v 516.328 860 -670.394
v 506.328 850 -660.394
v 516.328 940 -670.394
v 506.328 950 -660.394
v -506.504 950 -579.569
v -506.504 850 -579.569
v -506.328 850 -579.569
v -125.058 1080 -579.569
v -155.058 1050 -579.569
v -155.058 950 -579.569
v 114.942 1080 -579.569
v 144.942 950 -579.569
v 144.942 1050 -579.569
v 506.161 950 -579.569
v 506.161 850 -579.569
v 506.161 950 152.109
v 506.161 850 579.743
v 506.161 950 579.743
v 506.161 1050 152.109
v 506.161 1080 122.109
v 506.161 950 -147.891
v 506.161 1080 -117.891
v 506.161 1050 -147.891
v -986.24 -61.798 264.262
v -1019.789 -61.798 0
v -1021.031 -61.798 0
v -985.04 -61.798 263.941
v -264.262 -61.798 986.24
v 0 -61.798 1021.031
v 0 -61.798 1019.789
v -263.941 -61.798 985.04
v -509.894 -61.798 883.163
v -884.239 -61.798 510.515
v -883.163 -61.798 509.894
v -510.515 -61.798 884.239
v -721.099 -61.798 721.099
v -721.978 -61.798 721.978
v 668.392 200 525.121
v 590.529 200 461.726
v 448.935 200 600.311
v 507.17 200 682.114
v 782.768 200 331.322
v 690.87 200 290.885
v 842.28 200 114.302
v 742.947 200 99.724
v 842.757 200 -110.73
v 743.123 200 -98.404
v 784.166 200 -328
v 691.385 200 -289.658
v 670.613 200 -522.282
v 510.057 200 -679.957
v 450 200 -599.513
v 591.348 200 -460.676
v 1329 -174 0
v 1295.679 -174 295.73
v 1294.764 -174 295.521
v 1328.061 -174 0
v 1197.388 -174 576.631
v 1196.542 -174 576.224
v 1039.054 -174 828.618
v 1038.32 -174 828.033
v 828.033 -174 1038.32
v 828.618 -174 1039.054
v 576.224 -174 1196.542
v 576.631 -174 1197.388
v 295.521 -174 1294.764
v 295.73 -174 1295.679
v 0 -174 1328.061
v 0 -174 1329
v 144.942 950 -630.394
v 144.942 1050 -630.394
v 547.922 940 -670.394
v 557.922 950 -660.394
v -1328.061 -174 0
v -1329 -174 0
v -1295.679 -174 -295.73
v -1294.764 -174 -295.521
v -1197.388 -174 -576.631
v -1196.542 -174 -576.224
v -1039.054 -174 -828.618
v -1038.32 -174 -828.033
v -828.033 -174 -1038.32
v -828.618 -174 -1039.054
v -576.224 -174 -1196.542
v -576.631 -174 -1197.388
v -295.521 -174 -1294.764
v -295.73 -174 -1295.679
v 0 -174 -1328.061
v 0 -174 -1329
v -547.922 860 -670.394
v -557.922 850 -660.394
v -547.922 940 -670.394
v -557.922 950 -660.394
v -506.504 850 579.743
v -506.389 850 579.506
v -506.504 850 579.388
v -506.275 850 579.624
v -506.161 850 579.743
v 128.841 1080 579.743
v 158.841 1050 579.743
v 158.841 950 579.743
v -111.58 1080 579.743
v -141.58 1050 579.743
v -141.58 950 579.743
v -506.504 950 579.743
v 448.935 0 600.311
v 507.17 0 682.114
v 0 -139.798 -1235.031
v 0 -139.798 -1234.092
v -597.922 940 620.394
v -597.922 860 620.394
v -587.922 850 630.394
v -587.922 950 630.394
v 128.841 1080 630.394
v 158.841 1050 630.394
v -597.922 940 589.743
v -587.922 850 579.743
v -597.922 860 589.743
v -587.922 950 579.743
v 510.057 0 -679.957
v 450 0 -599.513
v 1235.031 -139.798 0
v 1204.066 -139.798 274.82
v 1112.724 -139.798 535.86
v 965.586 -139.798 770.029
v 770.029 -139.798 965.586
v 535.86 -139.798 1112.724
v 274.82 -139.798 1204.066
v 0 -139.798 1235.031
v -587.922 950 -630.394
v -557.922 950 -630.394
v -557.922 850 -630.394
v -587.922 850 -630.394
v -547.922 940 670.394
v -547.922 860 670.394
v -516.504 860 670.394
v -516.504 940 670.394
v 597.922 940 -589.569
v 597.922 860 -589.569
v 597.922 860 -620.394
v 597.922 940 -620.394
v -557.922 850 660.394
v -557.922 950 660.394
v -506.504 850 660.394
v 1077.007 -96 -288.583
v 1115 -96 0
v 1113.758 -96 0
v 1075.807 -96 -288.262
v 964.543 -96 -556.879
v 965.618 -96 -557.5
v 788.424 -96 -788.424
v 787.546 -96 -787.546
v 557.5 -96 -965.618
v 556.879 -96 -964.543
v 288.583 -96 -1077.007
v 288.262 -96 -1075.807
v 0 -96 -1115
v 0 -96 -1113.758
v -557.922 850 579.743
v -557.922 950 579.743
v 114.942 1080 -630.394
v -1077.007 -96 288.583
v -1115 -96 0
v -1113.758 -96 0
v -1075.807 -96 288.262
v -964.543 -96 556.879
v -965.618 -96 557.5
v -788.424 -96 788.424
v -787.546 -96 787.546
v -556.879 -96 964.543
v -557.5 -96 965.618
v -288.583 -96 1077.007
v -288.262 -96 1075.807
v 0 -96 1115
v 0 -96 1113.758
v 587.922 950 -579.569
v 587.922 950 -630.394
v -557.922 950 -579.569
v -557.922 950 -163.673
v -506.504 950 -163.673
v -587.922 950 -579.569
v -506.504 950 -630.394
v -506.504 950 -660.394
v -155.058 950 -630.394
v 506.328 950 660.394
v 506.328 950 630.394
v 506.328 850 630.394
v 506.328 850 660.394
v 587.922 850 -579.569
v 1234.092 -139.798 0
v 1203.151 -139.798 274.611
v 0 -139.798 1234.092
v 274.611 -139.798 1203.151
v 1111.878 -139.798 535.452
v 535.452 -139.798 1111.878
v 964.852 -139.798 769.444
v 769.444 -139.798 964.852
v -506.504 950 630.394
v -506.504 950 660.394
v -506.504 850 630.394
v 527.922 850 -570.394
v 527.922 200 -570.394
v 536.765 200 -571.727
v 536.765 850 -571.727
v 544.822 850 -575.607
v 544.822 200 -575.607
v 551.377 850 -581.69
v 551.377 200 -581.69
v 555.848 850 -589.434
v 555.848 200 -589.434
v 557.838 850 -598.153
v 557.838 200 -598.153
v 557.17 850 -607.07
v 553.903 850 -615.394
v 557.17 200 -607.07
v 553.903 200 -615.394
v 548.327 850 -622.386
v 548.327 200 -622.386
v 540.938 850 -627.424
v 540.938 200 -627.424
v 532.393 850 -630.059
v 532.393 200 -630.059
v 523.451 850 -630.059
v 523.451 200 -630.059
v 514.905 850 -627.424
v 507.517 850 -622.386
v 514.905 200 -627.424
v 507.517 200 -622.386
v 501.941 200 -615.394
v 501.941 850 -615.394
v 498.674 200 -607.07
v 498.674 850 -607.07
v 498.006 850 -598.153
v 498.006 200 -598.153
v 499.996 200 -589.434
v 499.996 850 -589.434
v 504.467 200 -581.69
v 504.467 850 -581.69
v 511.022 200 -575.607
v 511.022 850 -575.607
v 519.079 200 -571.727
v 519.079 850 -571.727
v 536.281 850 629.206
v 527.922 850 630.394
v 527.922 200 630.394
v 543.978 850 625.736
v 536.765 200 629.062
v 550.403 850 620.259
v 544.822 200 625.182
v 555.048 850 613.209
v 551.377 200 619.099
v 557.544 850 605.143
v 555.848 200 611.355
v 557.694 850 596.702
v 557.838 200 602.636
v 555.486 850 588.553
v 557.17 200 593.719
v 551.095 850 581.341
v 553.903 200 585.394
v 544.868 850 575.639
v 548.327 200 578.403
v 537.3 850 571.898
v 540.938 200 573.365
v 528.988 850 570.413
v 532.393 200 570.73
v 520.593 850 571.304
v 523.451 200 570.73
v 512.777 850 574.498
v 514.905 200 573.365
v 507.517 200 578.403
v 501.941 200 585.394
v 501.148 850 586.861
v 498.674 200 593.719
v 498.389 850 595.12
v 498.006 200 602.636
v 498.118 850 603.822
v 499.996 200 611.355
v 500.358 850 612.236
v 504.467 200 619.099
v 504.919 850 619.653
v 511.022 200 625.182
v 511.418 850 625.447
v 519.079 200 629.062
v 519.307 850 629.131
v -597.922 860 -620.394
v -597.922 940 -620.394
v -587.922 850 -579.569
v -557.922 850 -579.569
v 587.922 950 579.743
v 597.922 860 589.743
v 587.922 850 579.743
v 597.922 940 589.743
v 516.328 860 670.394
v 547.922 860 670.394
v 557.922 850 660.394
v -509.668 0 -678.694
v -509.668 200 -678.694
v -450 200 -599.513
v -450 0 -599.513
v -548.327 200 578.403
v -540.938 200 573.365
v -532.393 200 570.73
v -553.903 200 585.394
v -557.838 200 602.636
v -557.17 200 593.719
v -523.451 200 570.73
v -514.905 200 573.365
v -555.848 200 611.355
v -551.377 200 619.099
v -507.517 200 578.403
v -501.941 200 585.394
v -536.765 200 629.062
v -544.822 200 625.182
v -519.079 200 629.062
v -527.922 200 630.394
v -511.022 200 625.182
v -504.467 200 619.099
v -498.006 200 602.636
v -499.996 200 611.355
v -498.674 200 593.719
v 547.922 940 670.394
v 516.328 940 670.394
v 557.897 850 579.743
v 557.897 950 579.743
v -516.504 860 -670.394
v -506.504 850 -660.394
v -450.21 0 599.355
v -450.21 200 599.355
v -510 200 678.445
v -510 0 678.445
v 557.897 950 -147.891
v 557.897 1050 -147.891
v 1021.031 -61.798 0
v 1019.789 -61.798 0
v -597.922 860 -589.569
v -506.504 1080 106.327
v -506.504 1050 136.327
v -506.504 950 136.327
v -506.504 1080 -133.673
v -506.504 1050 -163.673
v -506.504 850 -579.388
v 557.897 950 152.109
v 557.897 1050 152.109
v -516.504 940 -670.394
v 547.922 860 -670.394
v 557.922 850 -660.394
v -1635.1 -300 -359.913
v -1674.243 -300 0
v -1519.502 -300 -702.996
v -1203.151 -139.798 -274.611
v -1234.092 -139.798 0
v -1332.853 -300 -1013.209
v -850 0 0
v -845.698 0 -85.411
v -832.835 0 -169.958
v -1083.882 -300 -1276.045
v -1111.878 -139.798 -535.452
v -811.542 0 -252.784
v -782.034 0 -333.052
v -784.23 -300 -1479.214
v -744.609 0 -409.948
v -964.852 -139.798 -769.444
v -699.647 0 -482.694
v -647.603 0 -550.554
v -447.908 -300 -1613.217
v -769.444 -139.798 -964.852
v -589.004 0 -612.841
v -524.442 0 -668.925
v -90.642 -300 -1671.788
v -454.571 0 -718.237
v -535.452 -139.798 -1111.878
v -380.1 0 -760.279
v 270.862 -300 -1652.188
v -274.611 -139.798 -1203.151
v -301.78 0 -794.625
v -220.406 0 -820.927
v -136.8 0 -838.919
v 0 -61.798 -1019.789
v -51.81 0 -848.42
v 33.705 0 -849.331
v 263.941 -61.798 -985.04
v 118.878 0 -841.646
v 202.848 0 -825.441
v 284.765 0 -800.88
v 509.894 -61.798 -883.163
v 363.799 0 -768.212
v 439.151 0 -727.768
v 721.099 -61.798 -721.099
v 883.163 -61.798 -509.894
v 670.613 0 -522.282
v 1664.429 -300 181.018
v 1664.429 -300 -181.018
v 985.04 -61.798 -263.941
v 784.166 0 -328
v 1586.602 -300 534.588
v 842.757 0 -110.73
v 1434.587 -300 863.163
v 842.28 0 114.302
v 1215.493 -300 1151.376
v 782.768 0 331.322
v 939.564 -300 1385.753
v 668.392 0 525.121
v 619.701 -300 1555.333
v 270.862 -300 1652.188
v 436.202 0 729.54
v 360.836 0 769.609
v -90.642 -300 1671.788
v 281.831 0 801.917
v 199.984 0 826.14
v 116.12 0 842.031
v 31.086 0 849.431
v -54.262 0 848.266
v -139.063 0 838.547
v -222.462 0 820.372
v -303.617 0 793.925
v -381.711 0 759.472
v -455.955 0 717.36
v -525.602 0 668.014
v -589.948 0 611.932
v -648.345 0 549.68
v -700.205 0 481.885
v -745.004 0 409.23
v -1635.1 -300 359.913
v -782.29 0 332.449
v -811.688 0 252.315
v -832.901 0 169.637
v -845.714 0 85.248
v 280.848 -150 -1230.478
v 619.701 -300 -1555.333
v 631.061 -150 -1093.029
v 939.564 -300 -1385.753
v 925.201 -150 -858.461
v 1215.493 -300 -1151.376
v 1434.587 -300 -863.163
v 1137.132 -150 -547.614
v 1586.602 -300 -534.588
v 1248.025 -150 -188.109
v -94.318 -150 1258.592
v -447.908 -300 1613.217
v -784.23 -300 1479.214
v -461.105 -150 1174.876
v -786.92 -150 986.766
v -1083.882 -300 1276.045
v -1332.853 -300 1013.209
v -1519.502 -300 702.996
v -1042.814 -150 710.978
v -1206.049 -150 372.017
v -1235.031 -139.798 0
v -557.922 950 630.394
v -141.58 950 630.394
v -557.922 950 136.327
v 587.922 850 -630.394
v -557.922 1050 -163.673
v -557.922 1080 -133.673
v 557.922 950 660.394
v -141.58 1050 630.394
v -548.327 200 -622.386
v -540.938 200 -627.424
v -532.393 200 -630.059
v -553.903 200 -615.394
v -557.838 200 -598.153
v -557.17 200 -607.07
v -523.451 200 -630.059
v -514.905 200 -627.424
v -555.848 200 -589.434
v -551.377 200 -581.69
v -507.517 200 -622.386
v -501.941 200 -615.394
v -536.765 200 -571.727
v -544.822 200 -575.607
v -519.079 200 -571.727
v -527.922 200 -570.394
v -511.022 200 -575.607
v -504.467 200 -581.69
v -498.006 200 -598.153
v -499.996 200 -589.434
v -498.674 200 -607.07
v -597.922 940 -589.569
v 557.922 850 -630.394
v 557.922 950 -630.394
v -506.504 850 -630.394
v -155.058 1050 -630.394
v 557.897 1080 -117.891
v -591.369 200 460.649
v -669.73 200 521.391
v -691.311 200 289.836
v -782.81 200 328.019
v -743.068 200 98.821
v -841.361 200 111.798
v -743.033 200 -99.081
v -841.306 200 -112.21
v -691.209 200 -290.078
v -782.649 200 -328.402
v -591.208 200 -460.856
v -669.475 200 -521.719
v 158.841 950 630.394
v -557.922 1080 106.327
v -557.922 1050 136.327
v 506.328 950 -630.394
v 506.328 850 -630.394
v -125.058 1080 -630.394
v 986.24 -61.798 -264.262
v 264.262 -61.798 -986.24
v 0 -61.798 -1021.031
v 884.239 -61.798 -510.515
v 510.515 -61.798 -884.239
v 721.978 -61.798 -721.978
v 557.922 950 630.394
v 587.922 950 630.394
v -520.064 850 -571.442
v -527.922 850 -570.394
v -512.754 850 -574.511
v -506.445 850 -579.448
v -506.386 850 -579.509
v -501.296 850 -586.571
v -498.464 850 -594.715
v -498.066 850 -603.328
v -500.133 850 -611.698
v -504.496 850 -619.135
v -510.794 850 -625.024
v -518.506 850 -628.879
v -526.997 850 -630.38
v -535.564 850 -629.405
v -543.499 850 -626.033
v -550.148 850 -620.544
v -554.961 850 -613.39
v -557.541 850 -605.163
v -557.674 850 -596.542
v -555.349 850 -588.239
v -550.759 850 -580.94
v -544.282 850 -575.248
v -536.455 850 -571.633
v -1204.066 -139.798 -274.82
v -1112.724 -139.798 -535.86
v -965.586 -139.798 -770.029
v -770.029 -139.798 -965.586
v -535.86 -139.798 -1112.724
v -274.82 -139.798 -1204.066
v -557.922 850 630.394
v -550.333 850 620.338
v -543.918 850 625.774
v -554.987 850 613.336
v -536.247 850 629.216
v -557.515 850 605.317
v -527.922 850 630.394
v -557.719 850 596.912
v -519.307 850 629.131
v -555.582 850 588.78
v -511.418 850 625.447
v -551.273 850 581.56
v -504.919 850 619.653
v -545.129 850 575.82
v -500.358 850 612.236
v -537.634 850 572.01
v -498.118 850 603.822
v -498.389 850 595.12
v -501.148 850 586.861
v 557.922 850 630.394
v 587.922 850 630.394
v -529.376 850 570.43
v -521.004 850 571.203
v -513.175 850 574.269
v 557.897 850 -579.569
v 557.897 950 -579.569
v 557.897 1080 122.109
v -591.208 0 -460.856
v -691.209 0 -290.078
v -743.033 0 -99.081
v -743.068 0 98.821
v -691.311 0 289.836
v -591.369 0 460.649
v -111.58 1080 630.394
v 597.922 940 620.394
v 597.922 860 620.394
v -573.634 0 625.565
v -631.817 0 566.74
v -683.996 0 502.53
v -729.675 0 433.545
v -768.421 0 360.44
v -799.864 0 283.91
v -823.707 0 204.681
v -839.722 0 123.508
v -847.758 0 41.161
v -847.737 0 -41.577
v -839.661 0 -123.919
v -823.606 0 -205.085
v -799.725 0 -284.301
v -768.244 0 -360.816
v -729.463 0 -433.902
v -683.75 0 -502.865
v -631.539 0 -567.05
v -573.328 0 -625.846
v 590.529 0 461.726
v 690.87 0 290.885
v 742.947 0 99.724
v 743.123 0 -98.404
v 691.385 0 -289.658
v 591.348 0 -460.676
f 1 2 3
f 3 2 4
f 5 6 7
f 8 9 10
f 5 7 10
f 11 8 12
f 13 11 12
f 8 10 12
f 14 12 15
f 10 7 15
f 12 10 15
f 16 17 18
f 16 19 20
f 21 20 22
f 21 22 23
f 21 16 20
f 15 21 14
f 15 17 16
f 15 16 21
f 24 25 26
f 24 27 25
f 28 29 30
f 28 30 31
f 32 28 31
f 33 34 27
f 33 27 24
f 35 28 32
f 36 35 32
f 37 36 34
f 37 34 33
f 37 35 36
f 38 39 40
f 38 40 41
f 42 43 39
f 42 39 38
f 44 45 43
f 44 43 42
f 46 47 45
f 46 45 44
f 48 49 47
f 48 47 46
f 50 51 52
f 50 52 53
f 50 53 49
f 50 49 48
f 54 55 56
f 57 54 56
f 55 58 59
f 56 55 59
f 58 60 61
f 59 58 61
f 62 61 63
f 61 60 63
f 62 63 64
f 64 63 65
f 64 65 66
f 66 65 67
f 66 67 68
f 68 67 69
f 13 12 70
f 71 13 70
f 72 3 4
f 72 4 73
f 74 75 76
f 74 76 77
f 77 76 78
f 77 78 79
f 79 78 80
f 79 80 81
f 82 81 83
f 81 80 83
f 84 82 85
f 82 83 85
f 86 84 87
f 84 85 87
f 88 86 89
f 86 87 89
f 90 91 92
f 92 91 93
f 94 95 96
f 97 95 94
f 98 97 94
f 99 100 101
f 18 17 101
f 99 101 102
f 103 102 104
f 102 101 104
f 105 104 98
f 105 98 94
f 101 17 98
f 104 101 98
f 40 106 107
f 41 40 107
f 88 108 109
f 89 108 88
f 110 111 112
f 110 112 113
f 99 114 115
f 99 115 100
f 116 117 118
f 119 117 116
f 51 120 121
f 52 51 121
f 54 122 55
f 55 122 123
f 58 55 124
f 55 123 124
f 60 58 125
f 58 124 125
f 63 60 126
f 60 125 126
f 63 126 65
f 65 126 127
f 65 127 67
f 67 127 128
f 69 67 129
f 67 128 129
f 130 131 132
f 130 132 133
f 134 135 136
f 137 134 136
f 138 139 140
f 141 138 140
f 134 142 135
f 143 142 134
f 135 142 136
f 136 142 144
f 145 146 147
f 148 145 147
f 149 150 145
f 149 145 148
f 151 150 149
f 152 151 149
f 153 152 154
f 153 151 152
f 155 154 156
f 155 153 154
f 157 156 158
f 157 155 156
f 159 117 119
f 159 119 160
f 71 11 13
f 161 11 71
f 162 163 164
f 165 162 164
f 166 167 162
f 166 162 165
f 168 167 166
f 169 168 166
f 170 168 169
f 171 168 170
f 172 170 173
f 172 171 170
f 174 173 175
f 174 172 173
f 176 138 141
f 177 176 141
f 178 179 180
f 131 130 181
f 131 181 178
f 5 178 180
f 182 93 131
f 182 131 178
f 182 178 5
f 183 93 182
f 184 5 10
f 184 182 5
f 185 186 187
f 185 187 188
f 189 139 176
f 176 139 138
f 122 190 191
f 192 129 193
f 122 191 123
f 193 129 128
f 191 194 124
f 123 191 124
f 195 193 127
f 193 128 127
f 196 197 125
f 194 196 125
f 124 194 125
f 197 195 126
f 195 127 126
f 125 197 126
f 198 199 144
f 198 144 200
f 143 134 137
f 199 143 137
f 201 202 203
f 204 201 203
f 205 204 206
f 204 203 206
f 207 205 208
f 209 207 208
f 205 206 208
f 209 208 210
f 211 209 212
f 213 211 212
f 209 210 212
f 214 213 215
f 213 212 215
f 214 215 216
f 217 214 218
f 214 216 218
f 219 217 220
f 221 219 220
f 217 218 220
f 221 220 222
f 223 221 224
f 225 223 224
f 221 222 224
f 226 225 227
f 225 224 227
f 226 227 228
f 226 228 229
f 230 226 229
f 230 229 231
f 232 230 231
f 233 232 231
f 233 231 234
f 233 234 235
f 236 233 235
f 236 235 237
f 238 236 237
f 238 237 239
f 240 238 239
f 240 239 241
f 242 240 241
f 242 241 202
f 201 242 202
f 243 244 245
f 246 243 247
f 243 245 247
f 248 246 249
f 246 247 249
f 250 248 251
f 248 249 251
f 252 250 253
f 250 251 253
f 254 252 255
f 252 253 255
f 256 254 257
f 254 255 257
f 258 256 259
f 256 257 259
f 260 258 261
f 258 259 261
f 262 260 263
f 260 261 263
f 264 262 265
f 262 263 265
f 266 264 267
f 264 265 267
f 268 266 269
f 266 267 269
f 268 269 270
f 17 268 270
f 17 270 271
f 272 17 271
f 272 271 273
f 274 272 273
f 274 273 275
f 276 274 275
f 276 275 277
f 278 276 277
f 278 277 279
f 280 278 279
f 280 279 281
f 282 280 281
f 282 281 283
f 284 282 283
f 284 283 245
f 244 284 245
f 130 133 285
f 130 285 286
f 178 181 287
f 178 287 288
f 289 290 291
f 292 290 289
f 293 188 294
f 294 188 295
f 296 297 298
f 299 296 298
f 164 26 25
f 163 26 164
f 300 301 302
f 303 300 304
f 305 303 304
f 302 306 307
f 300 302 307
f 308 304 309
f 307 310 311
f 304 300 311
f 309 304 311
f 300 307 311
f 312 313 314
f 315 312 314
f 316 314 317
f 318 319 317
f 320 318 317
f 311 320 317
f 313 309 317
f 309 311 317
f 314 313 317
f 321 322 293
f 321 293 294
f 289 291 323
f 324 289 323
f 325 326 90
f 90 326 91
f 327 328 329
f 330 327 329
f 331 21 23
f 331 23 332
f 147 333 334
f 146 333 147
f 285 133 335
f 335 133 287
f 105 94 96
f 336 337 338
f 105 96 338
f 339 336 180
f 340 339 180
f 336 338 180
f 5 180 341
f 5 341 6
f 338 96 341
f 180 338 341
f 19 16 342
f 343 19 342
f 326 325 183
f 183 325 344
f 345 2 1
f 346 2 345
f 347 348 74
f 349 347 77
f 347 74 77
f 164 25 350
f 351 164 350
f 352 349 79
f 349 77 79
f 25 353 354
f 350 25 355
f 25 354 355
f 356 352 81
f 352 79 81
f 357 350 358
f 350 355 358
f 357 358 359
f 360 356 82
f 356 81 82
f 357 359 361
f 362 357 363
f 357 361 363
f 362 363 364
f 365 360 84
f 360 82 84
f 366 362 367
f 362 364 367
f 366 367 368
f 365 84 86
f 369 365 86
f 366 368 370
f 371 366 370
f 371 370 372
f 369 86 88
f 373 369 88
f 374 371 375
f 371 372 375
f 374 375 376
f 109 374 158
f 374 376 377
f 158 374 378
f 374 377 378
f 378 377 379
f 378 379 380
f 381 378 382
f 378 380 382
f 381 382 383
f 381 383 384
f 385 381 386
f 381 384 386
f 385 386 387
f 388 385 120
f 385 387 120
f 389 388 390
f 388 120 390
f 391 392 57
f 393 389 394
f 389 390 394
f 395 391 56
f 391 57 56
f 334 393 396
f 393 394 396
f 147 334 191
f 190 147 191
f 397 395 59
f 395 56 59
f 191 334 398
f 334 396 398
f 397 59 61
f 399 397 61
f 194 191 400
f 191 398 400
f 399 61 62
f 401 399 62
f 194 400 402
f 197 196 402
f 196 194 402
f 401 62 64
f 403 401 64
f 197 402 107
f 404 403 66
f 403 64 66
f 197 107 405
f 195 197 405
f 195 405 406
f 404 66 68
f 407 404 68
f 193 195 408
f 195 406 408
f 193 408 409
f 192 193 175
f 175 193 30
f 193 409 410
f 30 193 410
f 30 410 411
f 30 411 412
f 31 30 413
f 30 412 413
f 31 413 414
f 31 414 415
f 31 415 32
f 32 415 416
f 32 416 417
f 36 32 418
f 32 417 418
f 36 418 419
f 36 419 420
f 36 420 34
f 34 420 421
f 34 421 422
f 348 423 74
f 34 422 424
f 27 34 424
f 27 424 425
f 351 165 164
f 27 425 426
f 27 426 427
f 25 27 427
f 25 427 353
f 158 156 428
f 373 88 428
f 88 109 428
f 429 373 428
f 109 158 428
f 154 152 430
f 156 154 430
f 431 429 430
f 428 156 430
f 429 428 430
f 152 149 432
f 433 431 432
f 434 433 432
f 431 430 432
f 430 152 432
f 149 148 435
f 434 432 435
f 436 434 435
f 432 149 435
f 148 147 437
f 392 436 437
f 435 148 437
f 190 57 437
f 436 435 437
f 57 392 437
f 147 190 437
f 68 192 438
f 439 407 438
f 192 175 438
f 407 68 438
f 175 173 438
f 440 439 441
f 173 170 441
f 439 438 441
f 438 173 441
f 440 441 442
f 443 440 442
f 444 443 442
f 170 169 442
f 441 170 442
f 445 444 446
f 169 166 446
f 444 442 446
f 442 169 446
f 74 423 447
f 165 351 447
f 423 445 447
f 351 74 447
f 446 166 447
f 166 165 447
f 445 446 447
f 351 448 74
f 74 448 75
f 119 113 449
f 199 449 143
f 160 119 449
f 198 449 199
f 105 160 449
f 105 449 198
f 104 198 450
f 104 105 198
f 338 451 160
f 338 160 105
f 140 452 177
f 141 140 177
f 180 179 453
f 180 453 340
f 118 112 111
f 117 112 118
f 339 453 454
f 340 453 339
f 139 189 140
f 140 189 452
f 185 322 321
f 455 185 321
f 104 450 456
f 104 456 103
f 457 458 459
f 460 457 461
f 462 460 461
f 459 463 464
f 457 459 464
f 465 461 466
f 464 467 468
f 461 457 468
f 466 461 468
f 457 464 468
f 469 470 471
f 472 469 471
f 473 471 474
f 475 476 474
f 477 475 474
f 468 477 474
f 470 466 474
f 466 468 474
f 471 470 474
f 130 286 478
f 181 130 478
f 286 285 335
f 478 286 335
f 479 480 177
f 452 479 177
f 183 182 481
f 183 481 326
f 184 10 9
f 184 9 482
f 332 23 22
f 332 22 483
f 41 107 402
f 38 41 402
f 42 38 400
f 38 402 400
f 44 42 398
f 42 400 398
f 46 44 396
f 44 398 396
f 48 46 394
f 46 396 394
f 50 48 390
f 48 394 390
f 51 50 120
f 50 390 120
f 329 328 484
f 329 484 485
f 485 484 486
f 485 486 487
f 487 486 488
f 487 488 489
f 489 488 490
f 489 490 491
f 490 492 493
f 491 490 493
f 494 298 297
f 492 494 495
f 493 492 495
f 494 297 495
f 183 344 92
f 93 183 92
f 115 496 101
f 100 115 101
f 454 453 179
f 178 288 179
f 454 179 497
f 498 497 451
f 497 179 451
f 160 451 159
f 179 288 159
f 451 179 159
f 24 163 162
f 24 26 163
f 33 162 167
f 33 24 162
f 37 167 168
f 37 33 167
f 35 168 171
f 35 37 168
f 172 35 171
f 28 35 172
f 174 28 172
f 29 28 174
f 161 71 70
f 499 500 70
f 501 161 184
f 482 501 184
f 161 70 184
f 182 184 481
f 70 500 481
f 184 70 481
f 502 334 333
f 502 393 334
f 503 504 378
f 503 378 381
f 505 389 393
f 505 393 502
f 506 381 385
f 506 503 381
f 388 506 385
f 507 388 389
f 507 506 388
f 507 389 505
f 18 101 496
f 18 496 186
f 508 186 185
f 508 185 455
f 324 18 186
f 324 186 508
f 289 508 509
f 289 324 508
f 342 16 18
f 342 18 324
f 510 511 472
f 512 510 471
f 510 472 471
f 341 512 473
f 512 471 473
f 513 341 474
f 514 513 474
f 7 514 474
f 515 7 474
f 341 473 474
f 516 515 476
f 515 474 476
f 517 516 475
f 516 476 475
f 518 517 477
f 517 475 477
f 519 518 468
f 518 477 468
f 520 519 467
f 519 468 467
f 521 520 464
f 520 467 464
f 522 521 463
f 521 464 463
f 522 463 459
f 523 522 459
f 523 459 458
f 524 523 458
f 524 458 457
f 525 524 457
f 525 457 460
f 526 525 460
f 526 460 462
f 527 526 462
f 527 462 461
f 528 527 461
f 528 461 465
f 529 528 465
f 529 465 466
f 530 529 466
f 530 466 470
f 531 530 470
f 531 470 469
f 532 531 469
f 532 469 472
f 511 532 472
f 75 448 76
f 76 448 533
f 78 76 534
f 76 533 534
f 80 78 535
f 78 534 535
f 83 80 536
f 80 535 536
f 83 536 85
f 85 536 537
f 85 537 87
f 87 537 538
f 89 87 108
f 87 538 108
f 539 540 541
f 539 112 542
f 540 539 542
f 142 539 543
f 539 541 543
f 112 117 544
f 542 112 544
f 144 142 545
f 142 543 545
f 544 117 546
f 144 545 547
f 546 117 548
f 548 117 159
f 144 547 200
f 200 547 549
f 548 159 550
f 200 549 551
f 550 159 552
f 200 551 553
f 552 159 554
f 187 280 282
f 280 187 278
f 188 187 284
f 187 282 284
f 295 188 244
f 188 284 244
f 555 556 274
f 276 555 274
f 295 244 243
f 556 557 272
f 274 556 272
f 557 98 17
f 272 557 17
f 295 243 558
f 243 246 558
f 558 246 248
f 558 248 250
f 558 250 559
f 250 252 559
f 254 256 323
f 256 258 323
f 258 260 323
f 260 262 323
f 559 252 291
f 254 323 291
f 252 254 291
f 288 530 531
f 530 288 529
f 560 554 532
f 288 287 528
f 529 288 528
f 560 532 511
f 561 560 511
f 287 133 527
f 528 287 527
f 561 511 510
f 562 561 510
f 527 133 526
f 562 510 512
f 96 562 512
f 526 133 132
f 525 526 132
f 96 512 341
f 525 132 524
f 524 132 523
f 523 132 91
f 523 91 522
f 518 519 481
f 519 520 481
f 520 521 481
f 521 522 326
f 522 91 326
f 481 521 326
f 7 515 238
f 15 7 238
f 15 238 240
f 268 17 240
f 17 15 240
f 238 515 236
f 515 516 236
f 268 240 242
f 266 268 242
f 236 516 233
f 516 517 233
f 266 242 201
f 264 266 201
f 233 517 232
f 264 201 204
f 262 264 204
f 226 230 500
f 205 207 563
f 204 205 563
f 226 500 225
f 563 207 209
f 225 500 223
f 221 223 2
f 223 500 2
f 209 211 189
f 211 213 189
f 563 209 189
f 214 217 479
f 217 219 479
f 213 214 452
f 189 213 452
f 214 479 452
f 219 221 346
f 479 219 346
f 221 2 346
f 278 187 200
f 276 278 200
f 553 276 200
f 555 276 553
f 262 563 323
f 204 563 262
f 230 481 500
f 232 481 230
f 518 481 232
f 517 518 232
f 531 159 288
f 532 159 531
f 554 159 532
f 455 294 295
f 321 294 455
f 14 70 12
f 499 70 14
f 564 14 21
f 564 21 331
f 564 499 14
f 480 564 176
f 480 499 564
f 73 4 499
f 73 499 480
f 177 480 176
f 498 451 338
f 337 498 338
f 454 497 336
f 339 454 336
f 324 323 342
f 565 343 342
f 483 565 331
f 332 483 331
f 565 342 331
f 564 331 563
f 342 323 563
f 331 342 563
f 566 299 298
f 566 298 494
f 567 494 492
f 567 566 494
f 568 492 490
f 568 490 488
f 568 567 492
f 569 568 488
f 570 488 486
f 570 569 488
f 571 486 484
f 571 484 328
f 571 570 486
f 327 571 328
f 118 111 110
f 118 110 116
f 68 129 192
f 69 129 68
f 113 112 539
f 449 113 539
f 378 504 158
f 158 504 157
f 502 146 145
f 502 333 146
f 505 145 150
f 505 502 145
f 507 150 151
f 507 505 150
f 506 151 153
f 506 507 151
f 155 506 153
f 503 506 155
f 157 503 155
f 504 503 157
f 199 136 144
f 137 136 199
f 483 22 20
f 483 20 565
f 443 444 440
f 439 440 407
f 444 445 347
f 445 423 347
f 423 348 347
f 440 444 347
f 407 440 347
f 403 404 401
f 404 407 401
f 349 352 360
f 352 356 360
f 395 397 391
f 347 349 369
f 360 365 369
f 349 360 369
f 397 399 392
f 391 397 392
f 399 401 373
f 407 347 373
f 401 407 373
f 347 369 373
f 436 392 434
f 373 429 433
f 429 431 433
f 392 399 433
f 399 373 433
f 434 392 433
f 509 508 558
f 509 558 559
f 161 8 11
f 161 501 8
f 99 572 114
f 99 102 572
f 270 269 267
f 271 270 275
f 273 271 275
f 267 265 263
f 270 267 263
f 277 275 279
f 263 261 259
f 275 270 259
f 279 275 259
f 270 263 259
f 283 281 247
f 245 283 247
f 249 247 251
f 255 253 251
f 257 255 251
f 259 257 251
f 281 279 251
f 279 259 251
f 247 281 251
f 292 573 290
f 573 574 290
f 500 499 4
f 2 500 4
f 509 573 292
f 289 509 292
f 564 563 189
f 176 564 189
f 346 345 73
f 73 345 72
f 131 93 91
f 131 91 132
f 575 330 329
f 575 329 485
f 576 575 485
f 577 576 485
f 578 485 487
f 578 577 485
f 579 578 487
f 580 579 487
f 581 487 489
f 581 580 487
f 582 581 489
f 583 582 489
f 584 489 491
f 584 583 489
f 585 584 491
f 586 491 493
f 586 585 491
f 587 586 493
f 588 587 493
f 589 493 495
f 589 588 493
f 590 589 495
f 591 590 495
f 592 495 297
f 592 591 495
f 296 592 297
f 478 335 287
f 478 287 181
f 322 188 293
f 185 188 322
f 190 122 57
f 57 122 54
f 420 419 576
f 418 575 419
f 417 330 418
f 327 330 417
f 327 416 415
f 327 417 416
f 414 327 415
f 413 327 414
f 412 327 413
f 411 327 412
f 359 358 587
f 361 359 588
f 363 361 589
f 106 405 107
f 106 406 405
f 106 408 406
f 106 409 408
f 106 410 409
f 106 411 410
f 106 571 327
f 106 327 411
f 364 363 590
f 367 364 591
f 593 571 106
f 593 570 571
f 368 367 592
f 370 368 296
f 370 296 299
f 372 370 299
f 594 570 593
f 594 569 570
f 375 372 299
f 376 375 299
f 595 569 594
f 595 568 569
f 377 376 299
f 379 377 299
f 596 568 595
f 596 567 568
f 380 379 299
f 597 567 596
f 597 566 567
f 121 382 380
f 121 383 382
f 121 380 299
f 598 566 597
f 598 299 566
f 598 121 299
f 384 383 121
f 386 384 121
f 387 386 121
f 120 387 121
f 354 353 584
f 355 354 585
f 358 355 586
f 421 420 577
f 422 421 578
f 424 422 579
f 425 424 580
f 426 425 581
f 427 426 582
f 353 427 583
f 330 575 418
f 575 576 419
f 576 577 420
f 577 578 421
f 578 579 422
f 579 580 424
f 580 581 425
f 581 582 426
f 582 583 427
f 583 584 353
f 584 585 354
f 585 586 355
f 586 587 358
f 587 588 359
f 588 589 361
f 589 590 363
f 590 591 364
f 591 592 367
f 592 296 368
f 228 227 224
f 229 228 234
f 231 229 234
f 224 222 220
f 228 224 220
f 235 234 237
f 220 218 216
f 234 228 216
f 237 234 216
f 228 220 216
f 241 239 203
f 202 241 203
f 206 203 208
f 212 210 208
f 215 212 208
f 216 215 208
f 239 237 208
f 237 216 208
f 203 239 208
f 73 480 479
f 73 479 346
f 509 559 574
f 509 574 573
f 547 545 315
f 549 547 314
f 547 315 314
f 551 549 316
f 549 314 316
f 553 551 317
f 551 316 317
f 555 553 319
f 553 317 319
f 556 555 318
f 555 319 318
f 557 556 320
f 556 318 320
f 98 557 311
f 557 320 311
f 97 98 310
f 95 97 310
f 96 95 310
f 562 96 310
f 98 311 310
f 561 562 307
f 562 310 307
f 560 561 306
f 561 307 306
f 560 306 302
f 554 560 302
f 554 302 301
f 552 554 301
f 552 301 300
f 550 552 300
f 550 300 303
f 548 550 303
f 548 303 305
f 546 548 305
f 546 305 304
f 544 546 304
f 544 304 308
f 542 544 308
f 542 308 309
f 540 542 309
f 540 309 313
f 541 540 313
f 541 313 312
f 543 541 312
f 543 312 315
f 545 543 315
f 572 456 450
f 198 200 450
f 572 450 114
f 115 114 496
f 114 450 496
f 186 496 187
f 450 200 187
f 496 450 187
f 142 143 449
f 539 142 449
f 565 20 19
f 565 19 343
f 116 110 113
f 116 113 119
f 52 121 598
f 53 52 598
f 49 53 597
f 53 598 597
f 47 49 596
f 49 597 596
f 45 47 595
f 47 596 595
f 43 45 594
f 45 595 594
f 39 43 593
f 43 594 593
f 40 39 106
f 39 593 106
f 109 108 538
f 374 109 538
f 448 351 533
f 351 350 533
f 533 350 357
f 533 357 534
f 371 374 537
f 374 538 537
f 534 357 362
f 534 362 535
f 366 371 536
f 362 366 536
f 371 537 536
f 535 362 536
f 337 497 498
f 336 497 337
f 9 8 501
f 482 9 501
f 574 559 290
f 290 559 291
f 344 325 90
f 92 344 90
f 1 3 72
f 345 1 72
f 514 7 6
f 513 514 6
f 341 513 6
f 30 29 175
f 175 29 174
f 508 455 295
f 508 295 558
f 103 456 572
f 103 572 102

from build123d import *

# Parameters (mm, degrees)
SKETCH_2_W        = 850
SKETCH_2_H        = 300
EXTRUDE_1_DEPTH   = 200
SKETCH_9_R        = 30
EXTRUDE_2_DEPTH   = 650
EXTRUDE_2_2_DEPTH = 650
EXTRUDE_2_3_DEPTH = 650
EXTRUDE_2_4_DEPTH = 650
SKETCH_10_W       = 40
SKETCH_10_H       = 50.651377378
SKETCH_10_W_2     = 51.417815055
SKETCH_10_H_2     = 40
SKETCH_10_W_3     = 1012.831920557
SKETCH_10_W_4     = 51.594176572
SKETCH_10_H_3     = 50.82526202
EXTRUDE_3_DEPTH   = 100
SKETCH_11_W       = 51.735384241
SKETCH_11_H       = 1159.312229664
EXTRUDE_4_DEPTH   = 100
CHAMFER_1_SIZE    = 10
CHAMFER_2_SIZE    = 10
CHAMFER_3_SIZE    = 10
SKETCH_14_W       = 300.420598197
SKETCH_14_H       = 50.651377378
SKETCH_14_W_2     = 51.735384241
SKETCH_14_H_2     = 300
SKETCH_14_W_3     = 300
SKETCH_14_H_3     = 50.82526202
SKETCH_14_W_4     = 51.417815055
EXTRUDE_5_DEPTH   = 130
CHAMFER_6_SIZE    = 30
CHAMFER_7_SIZE    = 30
REVOLVE_3_ANGLE   = 90
REVOLVE_4_ANGLE   = 90
REVOLVE_5_ANGLE   = 90
REVOLVE_6_ANGLE   = 90


with BuildPart() as part:
    # 草图2 → 旋转1 (revolve)
    with BuildSketch(Plane.XY, mode=Mode.PRIVATE) as revolve_1_sk:
        with Locations((425, -150)):
            Rectangle(SKETCH_2_W, SKETCH_2_H)
        Polygon((1674.243225836, -300), (850, 0), (850, -300), align=None)
    revolve(revolve_1_sk.sketch.rotate(Axis((0, 0, 0), (0, -1, 0)), 180), axis=Axis((0, 0, 0), (0, -1, 0)))

    # 草图7 → 凸台-拉伸1 (add)
    with BuildSketch(Plane(origin=(0, 0, 0), x_dir=(1, 0, 0), z_dir=(0, 1, 0))):
        with BuildLine():
            Line((-450.209657385, -599.355150386), (-510, -678.444772222))
            ThreePointArc((-510, -678.444772222), (-848.756305289, 0.207818597), (-509.66770348, 678.694438599))
            Line((-509.66770348, 678.694438599), (-450, 599.512578598))
            ThreePointArc((-450, 599.512578598), (-749.610108464, 0.131091439), (-450.209657385, -599.355150386))
        make_face()
        with BuildLine():
            Line((510.057293827, 679.957025858), (450, 599.512578598))
            ThreePointArc((450, 599.512578598), (749.609824622, -0.665376802), (448.935000026, -600.310501031))
            Line((448.935000026, -600.310501031), (507.169627968, -682.113603784))
            ThreePointArc((507.169627968, -682.113603784), (849.998089786, -1.802043456), (510.057293827, 679.957025858))
        make_face()
    extrude(amount=EXTRUDE_1_DEPTH)

    # 草图16 → 旋转3 (revolve)
    with BuildSketch(Plane.XY):
        Polygon((0, -174), (1329, -174), (1235.030737921, -139.797985667), (0, -139.797985667), align=None)
    revolve(axis=Axis((0, 0, 0), (0, -1, 0)), revolution_arc=REVOLVE_3_ANGLE)

    # 草图19 → 旋转4 (revolve)
    with BuildSketch(Plane.XY):
        Polygon((0, -174), (-1329, -174), (-1235.030737921, -139.797985667), (0, -139.797985667), align=None)
    revolve(axis=Axis((0, 0, 0), (0, -1, 0)), revolution_arc=REVOLVE_4_ANGLE)

    # 草图20 → 旋转5 (revolve)
    with BuildSketch(Plane.XY):
        Polygon((0, -96), (1115, -96), (1021.030737921, -61.797985667), (0, -61.797985667), align=None)
    revolve(axis=Axis((0, 0, 0), (0, 1, 0)), revolution_arc=REVOLVE_5_ANGLE)

    # 草图21 → 旋转6 (revolve)
    with BuildSketch(Plane.XY):
        Polygon((0, -96), (-1115, -96), (-1021.030737921, -61.797985667), (0, -61.797985667), align=None)
    revolve(axis=Axis((0, 0, 0), (0, 1, 0)), revolution_arc=REVOLVE_6_ANGLE)


with BuildPart() as body_2:
    # 草图9 → 凸台-拉伸2 (new body)
    with BuildSketch(Plane(origin=(0, 200, 0), x_dir=(1, 0, 0), z_dir=(0, 1, 0))):
        with Locations(Location((-527.921956092, -600.394434531, 0), (0, 0, 270))):
            Circle(SKETCH_9_R)
    extrude(amount=EXTRUDE_2_DEPTH)



with BuildPart() as body_3:
    # 草图9 → Extrude 2 2 (new body)
    with BuildSketch(Plane(origin=(0, 200, 0), x_dir=(1, 0, 0), z_dir=(0, 1, 0))):
        with Locations(Location((527.921956092, -600.394434531, 0), (0, 0, 270))):
            Circle(SKETCH_9_R)
    extrude(amount=EXTRUDE_2_2_DEPTH)


with BuildPart() as body_4:
    # 草图9 → Extrude 2 3 (new body)
    with BuildSketch(Plane(origin=(0, 200, 0), x_dir=(1, 0, 0), z_dir=(0, 1, 0))):
        with Locations(Location((527.921956092, 600.394434531, 0), (0, 0, 270))):
            Circle(SKETCH_9_R)
    extrude(amount=EXTRUDE_2_3_DEPTH)


with BuildPart() as body_5:
    # 草图9 → Extrude 2 4 (new body)
    with BuildSketch(Plane(origin=(0, 200, 0), x_dir=(1, 0, 0), z_dir=(0, 1, 0))):
        with Locations(Location((-527.921956092, 600.394434531, 0), (0, 0, 270))):
            Circle(SKETCH_9_R)
    extrude(amount=EXTRUDE_2_4_DEPTH)


with BuildPart() as body_2_1:
    add(body_2.part)

    add(body_3.part)  # 凸台-拉伸3 merges body 3

    add(body_4.part)  # 凸台-拉伸3 merges body 4

    add(body_5.part)  # 凸台-拉伸3 merges body 5
    # 草图10 → 凸台-拉伸3 (add)
    with BuildSketch(Plane(origin=(0, 850, 0), x_dir=(1, 0, 0), z_dir=(0, 1, 0))):
        Polygon((-597.921956092, 579.569172511), (-557.921956092, 579.569172511), (-557.921956092, 600.394434531), (-557.921956092, 630.394434531), (-597.921956092, 630.394434531), align=None)
        with BuildLine():
            Line((-557.921956092, 630.394434531), (-557.921956092, 600.394434531))
            ThreePointArc((-557.921956092, 600.394434531), (-549.135159528, 621.607637966), (-527.921956092, 630.394434531))
            Line((-527.921956092, 630.394434531), (-557.921956092, 630.394434531))
        make_face()
        with BuildLine():
            Line((-557.921956092, 600.394434531), (-557.921956092, 579.569172511))
            Line((-557.921956092, 579.569172511), (-549.516132664, 579.569172511))
            ThreePointArc((-549.516132664, 579.569172511), (-555.741241643, 589.165572103), (-557.921956092, 600.394434531))
        make_face()
        with BuildLine():
            Line((-549.516132664, 579.569172511), (-506.504141037, 579.569172511))
            Line((-506.504141037, 579.569172511), (-506.504141037, 621.401033452))
            ThreePointArc((-506.504141037, 621.401033452), (-516.30726642, 628.054857229), (-527.921956092, 630.394434531))
            ThreePointArc((-527.921956092, 630.394434531), (-549.135159528, 621.607637966), (-557.921956092, 600.394434531))
            ThreePointArc((-557.921956092, 600.394434531), (-555.741241643, 589.165572103), (-549.516132664, 579.569172511))
        make_face()
        with BuildLine():
            ThreePointArc((-527.921956092, 630.394434531), (-516.30726642, 628.054857229), (-506.504141037, 621.401033452))
            Line((-506.504141037, 621.401033452), (-506.504141037, 630.394434531))
            Line((-506.504141037, 630.394434531), (-527.921956092, 630.394434531))
        make_face()
        Polygon((-557.921956092, 670.394434531), (-557.921956092, 630.394434531), (-527.921956092, 630.394434531), (-506.504141037, 630.394434531), (-506.504141037, 670.394434531), align=None)
        with BuildLine():
            Line((-506.504141037, 621.401033452), (-506.504141037, 579.569172511))
            Line((-506.504141037, 579.569172511), (-506.32777952, 579.569172511))
            ThreePointArc((-506.32777952, 579.569172511), (-500.102670541, 589.165572103), (-497.921956092, 600.394434531))
            ThreePointArc((-497.921956092, 600.394434531), (-500.150257804, 611.740481162), (-506.504141037, 621.401033452))
        make_face()
        with BuildLine():
            ThreePointArc((-549.516132664, 579.569172511), (-528.048433814, 570.394701142), (-506.504141037, 579.387835609))
            Line((-506.504141037, 579.387835609), (-506.504141037, 579.569172511))
            Line((-506.504141037, 579.569172511), (-549.516132664, 579.569172511))
        make_face()
        with BuildLine():
            Line((-557.921956092, -579.743057153), (-506.504141037, -579.743057153))
            Line((-506.504141037, -579.743057153), (-506.504141037, 579.387835609))
            ThreePointArc((-506.504141037, 579.387835609), (-528.048433814, 570.394701142), (-549.516132664, 579.569172511))
            Line((-549.516132664, 579.569172511), (-557.921956092, 579.569172511))
            Line((-557.921956092, 579.569172511), (-557.921956092, -579.743057153))
        make_face()
        with BuildLine():
            Line((-506.32777952, 579.569172511), (506.32777952, 579.569172511))
            Line((506.32777952, 579.569172511), (506.32777952, 630.394434531))
            Line((506.32777952, 630.394434531), (-506.504141037, 630.394434531))
            Line((-506.504141037, 630.394434531), (-506.504141037, 621.401033452))
            ThreePointArc((-506.504141037, 621.401033452), (-500.150257804, 611.740481162), (-497.921956092, 600.394434531))
            ThreePointArc((-497.921956092, 600.394434531), (-500.102670541, 589.165572103), (-506.32777952, 579.569172511))
        make_face()
        with Locations((-577.921956092, -605.068745842)):
            Rectangle(SKETCH_10_W, SKETCH_10_H)
        with Locations((-532.213048565, -605.068745842)):
            Rectangle(SKETCH_10_W_2, SKETCH_10_H)
        with Locations((-532.213048565, -650.394434531)):
            Rectangle(SKETCH_10_W_2, SKETCH_10_H_2)
        with Locations((-0.088180758, -605.068745842)):
            Rectangle(SKETCH_10_W_3, SKETCH_10_H)
        with Locations((532.124867806, -605.068745842)):
            Rectangle(SKETCH_10_W_4, SKETCH_10_H)
        Polygon((557.921956092, -630.394434531), (506.32777952, -630.394434531), (506.32777952, -633.088964608), (506.32777952, -670.394434531), (557.921956092, -670.394434531), align=None)
        with Locations((577.921956092, -605.068745842)):
            Rectangle(SKETCH_10_W, SKETCH_10_H)
        with Locations((532.124867806, 650.394434531)):
            Rectangle(SKETCH_10_W_4, SKETCH_10_H_2)
        with Locations((532.124867806, 604.981803521)):
            Rectangle(SKETCH_10_W_4, SKETCH_10_H_3)
        with Locations((577.921956092, 604.981803521)):
            Rectangle(SKETCH_10_W, SKETCH_10_H_3)
    extrude(amount=EXTRUDE_3_DEPTH)

    # 草图11 → 凸台-拉伸4 (add)
    with BuildSketch(Plane(origin=(0, 850, 0), x_dir=(1, 0, 0), z_dir=(0, 1, 0))):
        with Locations((532.029119441, -0.086942321)):
            Rectangle(SKETCH_11_W, SKETCH_11_H)
    extrude(amount=EXTRUDE_4_DEPTH)

    # 倒角1
    chamfer_1_edges = [body_2_1.edges().sort_by_distance(p)[0] for p in [
        (597.921956092, 950, 605.068745842),
        (597.921956092, 900, 630.394434531),
        (597.921956092, 900, 579.743057153),
        (597.921956092, 850, 605.068745842),
    ]]
    chamfer(chamfer_1_edges, length=CHAMFER_1_SIZE)

    # 倒角2
    chamfer_2_edges = [body_2_1.edges().sort_by_distance(p)[0] for p in [
        (532.124867806, 950, 670.394434531),
        (506.32777952, 900, 670.394434531),
        (557.921956092, 900, 670.394434531),
        (532.124867806, 850, 670.394434531),
    ]]
    chamfer(chamfer_2_edges, length=CHAMFER_2_SIZE)

    # 倒角3
    chamfer_3_edges = [body_2_1.edges().sort_by_distance(p)[0] for p in [
        (532.124867806, 850, -670.394434531),
        (597.921956092, 850, -604.981803521),
        (597.921956092, 950, -604.981803521),
        (597.921956092, 900, -579.569172511),
        (597.921956092, 900, -630.394434531),
        (532.124867806, 950, -670.394434531),
        (557.921956092, 900, -670.394434531),
        (506.32777952, 900, -670.394434531),
        (-532.213048564, 850, -670.394434531),
        (-506.504141037, 900, -670.394434531),
        (-557.921956092, 900, -670.394434531),
        (-597.921956092, 850, -604.981803521),
        (-597.921956092, 900, -630.394434531),
        (-597.921956092, 900, -579.569172511),
        (-597.921956092, 850, 605.068745842),
        (-597.921956092, 900, 579.743057153),
        (-597.921956092, 900, 630.394434531),
        (-532.213048564, 850, 670.394434531),
        (-557.921956092, 900, 670.394434531),
        (-506.504141037, 900, 670.394434531),
        (-532.213048564, 950, -670.394434531),
        (-597.921956092, 950, -604.981803521),
        (-597.921956092, 950, 605.068745842),
        (-532.213048564, 950, 670.394434531),
    ]]
    chamfer(chamfer_3_edges, length=CHAMFER_3_SIZE)

    # 草图14 → 凸台-拉伸5 (add)
    with BuildSketch(Plane(origin=(0, 950, 0), x_dir=(1, 0, 0), z_dir=(0, 1, 0))):
        with Locations((8.630208478, -605.068745842)):
            Rectangle(SKETCH_14_W, SKETCH_14_H)
        with Locations((532.029119441, -2.109217431)):
            Rectangle(SKETCH_14_W_2, SKETCH_14_H_2)
        with Locations((-5.057905502, 604.981803521)):
            Rectangle(SKETCH_14_W_3, SKETCH_14_H_3)
        with Locations((-532.213048565, 13.672950277)):
            Rectangle(SKETCH_14_W_4, SKETCH_14_H_2)
    extrude(amount=EXTRUDE_5_DEPTH)

    # 倒角6
    chamfer_6_edges = [body_2_1.edges().sort_by_distance(p)[0] for p in [
        (532.029119441, 1080, 152.109217431),
    ]]
    chamfer(chamfer_6_edges, length=CHAMFER_6_SIZE)

    # 倒角7
    chamfer_7_edges = [body_2_1.edges().sort_by_distance(p)[0] for p in [
        (-141.580090621, 1080, 605.068745842),
        (158.840507576, 1080, 605.068745842),
        (532.029119441, 1080, -147.890782569),
        (-155.057905502, 1080, -604.981803521),
        (144.942094498, 1080, -604.981803521),
        (-532.213048564, 1080, 136.327049723),
        (-532.213048564, 1080, -163.672950277),
    ]]
    chamfer(chamfer_7_edges, length=CHAMFER_7_SIZE)


solid = Compound([part.part, body_2_1.part])
